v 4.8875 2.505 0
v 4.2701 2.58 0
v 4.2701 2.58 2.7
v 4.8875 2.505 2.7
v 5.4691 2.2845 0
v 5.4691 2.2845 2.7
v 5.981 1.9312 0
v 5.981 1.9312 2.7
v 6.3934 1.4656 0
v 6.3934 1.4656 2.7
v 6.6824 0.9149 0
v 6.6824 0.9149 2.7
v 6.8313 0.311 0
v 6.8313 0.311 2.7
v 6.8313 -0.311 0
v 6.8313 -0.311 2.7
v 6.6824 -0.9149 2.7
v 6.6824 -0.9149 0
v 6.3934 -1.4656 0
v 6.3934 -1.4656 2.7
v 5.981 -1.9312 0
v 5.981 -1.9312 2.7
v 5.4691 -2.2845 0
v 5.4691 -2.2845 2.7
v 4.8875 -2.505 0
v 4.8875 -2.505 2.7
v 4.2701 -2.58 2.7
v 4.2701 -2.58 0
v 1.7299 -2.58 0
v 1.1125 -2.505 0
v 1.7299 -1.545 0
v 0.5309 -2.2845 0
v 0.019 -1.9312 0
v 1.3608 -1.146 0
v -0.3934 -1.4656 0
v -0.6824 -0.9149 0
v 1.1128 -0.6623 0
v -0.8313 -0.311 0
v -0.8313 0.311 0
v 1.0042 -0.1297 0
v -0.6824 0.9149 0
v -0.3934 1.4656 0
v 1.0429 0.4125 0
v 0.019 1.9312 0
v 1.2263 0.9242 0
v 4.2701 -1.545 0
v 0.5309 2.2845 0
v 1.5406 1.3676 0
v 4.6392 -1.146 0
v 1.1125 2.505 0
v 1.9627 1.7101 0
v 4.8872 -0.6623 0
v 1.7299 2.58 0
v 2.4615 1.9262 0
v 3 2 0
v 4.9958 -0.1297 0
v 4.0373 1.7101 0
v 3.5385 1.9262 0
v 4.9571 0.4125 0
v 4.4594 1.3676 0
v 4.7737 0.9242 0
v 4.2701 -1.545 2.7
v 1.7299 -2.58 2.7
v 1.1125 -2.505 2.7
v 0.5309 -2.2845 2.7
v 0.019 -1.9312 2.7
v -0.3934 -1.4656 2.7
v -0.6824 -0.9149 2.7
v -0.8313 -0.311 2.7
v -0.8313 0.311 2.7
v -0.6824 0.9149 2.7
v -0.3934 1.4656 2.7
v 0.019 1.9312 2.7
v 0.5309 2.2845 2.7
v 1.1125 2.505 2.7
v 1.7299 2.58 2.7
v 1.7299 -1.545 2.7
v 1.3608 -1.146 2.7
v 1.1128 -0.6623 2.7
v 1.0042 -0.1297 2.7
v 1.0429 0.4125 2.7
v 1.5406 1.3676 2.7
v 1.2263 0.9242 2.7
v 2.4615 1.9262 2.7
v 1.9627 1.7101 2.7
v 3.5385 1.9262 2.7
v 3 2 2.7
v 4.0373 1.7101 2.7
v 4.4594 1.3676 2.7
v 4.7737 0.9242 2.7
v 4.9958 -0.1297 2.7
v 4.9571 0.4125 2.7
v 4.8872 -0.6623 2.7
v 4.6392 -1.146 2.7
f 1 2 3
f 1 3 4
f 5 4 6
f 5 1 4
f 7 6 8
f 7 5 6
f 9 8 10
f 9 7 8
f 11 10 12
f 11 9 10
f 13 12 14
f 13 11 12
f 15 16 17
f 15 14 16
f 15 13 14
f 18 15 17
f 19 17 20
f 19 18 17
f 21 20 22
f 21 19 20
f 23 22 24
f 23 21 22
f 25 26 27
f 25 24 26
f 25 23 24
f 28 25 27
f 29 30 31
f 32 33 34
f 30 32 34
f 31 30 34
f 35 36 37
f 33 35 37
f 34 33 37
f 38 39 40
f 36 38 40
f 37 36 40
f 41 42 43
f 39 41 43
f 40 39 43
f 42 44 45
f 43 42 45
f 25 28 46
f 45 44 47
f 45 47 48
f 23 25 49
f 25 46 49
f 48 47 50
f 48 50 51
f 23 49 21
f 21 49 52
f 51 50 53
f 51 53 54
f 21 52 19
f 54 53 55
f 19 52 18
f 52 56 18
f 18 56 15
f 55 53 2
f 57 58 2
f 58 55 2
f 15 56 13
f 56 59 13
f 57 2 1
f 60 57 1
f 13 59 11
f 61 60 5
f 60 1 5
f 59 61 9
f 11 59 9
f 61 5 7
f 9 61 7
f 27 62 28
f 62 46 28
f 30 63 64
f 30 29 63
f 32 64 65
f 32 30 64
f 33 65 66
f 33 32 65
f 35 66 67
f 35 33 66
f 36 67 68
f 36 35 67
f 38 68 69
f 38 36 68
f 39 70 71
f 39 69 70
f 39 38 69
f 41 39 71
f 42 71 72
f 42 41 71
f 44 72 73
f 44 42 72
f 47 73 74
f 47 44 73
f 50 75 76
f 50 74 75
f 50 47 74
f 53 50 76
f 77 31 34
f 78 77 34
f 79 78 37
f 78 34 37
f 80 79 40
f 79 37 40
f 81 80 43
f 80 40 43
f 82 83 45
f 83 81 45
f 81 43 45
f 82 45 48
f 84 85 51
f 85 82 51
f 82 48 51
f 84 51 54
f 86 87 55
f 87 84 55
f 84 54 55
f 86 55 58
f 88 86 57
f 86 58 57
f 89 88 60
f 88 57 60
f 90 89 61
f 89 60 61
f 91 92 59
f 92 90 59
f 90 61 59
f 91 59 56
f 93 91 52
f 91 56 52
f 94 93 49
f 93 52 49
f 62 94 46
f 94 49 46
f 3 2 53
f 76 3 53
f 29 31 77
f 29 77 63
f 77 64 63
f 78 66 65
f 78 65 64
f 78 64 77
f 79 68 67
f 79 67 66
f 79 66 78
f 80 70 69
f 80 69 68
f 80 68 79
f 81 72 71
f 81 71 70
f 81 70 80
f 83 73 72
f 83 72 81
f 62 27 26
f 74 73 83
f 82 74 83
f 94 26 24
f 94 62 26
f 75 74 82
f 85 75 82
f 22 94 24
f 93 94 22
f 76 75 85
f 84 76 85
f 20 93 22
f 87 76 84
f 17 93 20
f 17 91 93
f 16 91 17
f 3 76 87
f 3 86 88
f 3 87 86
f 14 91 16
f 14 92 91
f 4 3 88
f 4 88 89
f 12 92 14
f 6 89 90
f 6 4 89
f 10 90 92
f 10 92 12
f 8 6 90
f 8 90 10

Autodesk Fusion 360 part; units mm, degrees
sketch "Sketch1" plane through (0, 0, 0) normal (0, 0, 1) x (1, 0, 0)
  line L0 (-0.85, -0.0168) -> (-0.85, 9) construction
  line L1 (6.85, -0.0176) -> (6.85, 9) construction
  line L2 (1.7299, 0) -> (1.7299, 2.58) construction
  line L3 (4.2701, 0) -> (4.2701, 2.58) construction
  line L4 (4.2701, 0) -> (4.2701, -2.58) construction
  line L5 (1.7299, 0) -> (1.7299, -2.58) construction
  line L6 (4.2701, 2.58) -> (1.7299, 2.58)
  line L7 (3, 2.2457) -> (3, -2.58) construction
  arc A0 (1.7299, 2.58) -> (1.7299, -2.58) centre (1.7299, 0) ccw
  arc A1 (4.2701, -2.58) -> (4.2701, 2.58) centre (4.2701, 0) ccw
  line L8 (1.7299, -1.545) -> (1.7299, -2.58)
  line L9 (4.2701, -1.545) -> (4.2701, -2.58)
  arc A2 (4.2701, -1.545) -> (1.7299, -1.545) centre (3, 0) ccw
  dimension "d3" = 7.7
  dimension "d4" = 4
extrude "Extrude1" add sketch "Sketch1" along normal blind 2.7
